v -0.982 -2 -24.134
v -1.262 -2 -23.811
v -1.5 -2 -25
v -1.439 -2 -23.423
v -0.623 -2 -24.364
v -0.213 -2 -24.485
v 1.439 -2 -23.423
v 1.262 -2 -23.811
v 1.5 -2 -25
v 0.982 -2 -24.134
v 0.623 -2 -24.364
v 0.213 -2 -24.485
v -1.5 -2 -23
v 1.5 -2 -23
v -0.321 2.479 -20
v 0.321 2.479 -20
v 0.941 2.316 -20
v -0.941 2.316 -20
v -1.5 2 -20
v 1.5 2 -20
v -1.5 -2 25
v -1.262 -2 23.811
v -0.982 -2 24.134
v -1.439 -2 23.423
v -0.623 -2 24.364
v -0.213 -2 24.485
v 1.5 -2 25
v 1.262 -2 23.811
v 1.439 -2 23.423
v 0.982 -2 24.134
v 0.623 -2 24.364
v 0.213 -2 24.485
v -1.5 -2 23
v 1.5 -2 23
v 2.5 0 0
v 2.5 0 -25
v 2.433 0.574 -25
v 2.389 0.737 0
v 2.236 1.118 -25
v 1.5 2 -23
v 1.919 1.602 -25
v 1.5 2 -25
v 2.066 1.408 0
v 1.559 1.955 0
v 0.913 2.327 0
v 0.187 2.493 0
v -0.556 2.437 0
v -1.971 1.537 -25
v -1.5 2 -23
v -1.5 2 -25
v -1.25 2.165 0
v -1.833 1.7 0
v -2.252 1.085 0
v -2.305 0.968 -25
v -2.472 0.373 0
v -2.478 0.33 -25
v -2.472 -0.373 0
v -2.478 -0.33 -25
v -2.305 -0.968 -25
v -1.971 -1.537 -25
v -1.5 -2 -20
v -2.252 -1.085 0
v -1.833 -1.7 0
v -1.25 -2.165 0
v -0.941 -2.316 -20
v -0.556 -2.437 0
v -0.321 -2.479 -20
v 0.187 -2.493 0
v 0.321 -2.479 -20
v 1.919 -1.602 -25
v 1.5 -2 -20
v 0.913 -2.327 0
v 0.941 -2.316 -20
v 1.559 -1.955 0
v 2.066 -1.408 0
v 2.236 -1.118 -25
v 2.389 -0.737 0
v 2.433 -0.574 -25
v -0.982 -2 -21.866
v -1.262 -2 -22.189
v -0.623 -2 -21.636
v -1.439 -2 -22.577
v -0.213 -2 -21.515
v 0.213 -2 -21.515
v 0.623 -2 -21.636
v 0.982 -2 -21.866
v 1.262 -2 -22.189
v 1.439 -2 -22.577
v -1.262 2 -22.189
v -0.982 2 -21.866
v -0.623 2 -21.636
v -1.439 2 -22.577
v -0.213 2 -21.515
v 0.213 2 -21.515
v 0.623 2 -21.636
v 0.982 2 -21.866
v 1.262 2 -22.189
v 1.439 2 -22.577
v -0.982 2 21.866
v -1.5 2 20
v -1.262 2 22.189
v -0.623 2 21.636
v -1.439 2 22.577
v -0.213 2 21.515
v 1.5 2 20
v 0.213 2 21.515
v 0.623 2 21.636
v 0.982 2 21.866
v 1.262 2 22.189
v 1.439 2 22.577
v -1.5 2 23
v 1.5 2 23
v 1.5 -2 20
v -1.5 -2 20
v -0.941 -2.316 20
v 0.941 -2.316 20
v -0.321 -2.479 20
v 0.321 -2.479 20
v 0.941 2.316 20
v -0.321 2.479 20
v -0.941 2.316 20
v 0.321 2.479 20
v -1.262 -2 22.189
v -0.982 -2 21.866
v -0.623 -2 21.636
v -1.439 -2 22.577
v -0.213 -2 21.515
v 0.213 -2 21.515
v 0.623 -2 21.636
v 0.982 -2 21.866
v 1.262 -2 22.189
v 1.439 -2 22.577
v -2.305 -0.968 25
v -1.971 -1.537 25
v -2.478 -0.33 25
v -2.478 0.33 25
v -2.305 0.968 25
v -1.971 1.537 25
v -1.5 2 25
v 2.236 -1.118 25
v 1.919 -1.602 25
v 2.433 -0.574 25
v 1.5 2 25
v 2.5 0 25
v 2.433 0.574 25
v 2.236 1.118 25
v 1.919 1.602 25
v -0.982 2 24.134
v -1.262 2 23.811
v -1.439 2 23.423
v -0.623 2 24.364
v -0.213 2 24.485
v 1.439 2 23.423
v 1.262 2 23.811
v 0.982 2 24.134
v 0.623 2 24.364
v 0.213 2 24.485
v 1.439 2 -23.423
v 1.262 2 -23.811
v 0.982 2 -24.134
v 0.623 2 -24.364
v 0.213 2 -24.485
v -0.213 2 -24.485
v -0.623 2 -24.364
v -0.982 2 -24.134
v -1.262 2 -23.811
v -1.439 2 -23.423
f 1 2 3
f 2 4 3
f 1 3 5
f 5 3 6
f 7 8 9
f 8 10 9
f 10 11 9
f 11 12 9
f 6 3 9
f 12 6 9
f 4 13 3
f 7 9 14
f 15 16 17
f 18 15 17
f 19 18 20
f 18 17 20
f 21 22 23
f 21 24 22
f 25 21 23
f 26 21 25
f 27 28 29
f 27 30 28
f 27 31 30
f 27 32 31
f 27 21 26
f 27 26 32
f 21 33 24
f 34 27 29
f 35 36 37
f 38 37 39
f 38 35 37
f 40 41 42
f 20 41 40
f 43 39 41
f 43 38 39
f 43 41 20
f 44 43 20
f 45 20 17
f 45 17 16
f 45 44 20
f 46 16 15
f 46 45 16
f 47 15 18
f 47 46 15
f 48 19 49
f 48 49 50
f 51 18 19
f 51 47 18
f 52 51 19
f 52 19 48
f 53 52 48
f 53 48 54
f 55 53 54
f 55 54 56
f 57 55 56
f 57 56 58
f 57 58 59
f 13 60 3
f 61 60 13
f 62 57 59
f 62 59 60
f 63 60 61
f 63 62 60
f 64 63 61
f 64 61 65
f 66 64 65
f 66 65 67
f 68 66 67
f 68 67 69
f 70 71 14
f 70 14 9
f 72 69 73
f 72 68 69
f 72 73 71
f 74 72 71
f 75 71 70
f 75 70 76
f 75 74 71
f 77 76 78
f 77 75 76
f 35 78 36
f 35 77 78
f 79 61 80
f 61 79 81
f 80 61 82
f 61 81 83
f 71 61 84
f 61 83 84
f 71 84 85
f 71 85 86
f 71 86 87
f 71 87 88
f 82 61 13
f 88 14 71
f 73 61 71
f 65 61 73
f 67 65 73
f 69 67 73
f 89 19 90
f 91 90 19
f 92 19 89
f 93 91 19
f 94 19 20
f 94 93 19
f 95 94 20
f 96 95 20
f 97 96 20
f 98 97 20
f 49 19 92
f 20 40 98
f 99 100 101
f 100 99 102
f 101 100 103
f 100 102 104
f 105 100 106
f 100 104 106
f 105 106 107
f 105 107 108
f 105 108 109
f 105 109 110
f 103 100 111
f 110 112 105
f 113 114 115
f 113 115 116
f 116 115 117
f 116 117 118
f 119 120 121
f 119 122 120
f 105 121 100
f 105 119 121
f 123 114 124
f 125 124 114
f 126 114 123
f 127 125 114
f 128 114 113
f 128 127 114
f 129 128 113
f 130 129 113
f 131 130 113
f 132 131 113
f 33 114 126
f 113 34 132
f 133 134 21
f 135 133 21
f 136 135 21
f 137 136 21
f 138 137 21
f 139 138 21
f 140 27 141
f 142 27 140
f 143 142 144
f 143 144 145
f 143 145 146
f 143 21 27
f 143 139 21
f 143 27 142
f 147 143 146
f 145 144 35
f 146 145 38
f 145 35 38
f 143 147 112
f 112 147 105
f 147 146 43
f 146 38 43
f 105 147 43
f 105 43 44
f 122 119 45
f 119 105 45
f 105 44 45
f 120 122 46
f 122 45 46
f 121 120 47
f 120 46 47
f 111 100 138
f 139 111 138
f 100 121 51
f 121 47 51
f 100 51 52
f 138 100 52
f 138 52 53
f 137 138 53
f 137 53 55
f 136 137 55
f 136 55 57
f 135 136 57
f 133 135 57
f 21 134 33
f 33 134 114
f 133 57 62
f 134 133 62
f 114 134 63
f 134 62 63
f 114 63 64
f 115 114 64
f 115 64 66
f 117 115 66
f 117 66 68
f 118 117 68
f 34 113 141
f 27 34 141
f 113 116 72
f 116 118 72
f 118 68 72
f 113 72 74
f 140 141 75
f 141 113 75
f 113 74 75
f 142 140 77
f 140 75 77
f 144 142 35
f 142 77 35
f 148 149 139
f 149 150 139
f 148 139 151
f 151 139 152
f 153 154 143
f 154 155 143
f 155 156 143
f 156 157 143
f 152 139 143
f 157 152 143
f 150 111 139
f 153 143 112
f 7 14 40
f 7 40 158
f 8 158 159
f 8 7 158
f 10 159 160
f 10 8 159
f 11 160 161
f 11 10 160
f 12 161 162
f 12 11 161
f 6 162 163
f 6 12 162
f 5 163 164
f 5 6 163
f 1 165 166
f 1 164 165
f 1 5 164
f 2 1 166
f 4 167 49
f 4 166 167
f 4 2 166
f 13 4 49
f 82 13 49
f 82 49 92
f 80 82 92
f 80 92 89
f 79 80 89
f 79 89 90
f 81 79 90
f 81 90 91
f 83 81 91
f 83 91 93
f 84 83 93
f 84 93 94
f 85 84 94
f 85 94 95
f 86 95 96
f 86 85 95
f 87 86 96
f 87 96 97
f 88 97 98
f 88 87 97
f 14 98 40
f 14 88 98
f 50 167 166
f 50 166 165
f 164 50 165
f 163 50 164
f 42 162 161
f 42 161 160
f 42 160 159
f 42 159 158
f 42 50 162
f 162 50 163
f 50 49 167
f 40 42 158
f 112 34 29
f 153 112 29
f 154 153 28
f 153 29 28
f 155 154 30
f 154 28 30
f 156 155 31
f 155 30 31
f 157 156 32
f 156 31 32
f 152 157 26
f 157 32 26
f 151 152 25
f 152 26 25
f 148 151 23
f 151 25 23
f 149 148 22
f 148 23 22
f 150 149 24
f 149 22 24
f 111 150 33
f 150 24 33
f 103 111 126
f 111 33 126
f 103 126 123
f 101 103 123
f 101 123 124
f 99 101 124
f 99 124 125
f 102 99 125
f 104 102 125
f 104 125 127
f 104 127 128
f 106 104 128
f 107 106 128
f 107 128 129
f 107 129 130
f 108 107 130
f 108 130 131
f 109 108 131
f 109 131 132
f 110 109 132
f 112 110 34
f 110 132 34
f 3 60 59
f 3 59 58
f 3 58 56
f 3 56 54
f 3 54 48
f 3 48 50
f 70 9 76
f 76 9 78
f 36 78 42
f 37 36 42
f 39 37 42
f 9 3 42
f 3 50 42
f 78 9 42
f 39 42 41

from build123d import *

# Parameters (mm, degrees)
SKETCH_R        = 2.5
PAD_DEPTH       = 25
SKETCH001_W     = 5
SKETCH001_H     = 0.5
POCKET_DEPTH    = 5
SKETCH002_R     = 1.5
POCKET001_DEPTH = 56.462524


with BuildPart() as part:
    # Sketch → Pad (new body)
    with BuildSketch(Plane.XY):
        Circle(SKETCH_R)
    pad = extrude(amount=PAD_DEPTH)

    # Sketch001 (on Face3 of Pad) → Pocket (cut)
    with BuildSketch(Plane.XY.offset(25)):
        with Locations((0, 2.25)):
            Rectangle(SKETCH001_W, SKETCH001_H)
        with Locations((0, -2.25)):
            Rectangle(SKETCH001_W, SKETCH001_H)
    pocket = extrude(amount=-POCKET_DEPTH, mode=Mode.SUBTRACT)

    # Sketch002 (on Face4 of Pocket) → Pocket001 (cut, through all)
    with BuildSketch(Plane.XZ.offset(2)):
        with Locations((0, 23)):
            Circle(SKETCH002_R)
    pocket001 = extrude(amount=-POCKET001_DEPTH, mode=Mode.SUBTRACT)

    # Mirrored: Pad across face of Pocket001
    add(pad.mirror(Plane(origin=(0, 0, 0), x_dir=(1, 0, 0), z_dir=(0, 0, -1))))

    # Mirrored001: Pocket across XY
    add(pocket.mirror(Plane.XY), mode=Mode.SUBTRACT)

    # Mirrored002: Pocket001 across XY
    add(pocket001.mirror(Plane.XY), mode=Mode.SUBTRACT)


solid = part.part
